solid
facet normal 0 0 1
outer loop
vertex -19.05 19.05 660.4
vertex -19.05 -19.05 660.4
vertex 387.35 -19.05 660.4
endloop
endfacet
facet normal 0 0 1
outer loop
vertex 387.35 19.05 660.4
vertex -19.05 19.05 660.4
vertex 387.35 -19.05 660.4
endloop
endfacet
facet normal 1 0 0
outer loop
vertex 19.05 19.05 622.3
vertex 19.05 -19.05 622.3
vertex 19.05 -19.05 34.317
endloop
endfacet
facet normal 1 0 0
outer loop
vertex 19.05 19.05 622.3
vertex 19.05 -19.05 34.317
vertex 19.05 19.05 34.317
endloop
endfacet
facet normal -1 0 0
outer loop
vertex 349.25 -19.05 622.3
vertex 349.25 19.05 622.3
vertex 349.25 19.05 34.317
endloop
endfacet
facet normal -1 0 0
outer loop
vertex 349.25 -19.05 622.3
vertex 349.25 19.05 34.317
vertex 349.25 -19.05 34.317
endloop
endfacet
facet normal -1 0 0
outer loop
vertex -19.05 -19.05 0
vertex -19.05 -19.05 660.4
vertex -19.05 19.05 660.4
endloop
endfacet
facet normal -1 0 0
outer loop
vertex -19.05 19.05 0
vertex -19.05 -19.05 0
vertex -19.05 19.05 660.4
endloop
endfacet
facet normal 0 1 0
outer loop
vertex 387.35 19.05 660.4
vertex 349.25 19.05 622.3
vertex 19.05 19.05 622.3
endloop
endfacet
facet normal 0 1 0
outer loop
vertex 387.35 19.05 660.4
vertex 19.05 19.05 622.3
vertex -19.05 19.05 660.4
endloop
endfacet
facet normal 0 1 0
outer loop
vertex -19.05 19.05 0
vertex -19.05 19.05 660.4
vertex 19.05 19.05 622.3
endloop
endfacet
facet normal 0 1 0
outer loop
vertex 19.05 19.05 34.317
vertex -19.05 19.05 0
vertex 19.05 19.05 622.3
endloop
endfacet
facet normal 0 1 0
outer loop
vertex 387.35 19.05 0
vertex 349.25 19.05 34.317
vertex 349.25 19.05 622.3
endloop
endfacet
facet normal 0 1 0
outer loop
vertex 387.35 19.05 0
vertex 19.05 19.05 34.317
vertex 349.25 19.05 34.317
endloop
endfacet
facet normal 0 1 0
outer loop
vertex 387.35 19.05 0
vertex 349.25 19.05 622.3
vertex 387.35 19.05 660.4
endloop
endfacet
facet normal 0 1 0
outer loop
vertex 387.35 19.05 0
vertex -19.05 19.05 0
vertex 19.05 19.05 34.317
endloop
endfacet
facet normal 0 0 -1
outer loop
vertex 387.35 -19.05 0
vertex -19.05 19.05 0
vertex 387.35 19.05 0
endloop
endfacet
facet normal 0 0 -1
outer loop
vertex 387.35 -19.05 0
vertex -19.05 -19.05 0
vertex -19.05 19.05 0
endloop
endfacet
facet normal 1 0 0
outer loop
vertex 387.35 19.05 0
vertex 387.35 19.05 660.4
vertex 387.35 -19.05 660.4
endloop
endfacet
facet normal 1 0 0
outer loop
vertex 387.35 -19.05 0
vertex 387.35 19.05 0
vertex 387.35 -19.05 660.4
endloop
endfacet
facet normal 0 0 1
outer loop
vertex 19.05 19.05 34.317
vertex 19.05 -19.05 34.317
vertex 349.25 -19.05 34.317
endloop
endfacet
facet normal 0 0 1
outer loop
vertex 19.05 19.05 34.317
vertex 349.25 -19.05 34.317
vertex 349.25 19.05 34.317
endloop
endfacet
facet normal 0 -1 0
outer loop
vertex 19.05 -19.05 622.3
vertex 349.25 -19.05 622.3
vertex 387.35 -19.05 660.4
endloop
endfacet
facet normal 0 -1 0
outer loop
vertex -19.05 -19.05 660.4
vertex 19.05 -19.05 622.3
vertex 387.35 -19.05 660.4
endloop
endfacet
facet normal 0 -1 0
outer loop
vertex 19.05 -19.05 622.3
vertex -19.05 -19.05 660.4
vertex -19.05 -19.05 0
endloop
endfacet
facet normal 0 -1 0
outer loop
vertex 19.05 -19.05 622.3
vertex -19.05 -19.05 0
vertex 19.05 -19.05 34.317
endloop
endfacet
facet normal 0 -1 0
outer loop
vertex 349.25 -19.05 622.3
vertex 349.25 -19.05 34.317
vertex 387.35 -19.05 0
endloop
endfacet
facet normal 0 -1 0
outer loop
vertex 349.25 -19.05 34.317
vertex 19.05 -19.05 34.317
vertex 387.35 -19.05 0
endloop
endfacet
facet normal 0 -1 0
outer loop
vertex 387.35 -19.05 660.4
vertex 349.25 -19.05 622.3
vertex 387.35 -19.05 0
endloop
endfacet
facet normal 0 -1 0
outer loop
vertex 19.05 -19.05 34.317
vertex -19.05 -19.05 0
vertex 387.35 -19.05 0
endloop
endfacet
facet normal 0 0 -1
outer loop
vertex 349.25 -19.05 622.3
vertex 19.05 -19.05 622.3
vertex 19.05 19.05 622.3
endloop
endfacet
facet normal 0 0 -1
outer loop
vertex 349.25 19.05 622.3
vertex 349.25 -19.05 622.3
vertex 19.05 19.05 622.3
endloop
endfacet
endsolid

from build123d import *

# Parameters (mm, degrees)
F0_W     = 38.1
F0_H     = 38.1
F1_DEPTH = 660.4
F2_W     = 38.1
F2_H     = 38.1
F3_DEPTH = 330.2
F4_W     = 38.1
F4_H     = 34.3169383705
F5_DEPTH = 330.2
F6_W     = 38.1
F6_H     = 38.1
F7_DEPTH = 660.4


with BuildPart() as f1:
    # F0 (on Top) → F1 (new body)
    with BuildSketch(Plane.XY):
        Rectangle(F0_W, F0_H)
    extrude(amount=F1_DEPTH)

    # F2 (on face) → F3 (join)
    with BuildSketch(Plane.YZ.offset(19.05)):
        with Locations((0, 641.35)):
            Rectangle(F2_W, F2_H)
    extrude(amount=F3_DEPTH)

    # F4 (on face) → F5 (join)
    with BuildSketch(Plane.YZ.offset(19.05)):
        with Locations((0, 17.1584691852)):
            Rectangle(F4_W, F4_H)
    extrude(amount=F5_DEPTH)

    # F6 (on face) → F7 (join)
    with BuildSketch(Plane(origin=(0, 0, 0), x_dir=(1, 0, 0), z_dir=(0, 0, -1))):
        with Locations((368.3, 0)):
            Rectangle(F6_W, F6_H)
    extrude(amount=-F7_DEPTH)


solid = f1.part
